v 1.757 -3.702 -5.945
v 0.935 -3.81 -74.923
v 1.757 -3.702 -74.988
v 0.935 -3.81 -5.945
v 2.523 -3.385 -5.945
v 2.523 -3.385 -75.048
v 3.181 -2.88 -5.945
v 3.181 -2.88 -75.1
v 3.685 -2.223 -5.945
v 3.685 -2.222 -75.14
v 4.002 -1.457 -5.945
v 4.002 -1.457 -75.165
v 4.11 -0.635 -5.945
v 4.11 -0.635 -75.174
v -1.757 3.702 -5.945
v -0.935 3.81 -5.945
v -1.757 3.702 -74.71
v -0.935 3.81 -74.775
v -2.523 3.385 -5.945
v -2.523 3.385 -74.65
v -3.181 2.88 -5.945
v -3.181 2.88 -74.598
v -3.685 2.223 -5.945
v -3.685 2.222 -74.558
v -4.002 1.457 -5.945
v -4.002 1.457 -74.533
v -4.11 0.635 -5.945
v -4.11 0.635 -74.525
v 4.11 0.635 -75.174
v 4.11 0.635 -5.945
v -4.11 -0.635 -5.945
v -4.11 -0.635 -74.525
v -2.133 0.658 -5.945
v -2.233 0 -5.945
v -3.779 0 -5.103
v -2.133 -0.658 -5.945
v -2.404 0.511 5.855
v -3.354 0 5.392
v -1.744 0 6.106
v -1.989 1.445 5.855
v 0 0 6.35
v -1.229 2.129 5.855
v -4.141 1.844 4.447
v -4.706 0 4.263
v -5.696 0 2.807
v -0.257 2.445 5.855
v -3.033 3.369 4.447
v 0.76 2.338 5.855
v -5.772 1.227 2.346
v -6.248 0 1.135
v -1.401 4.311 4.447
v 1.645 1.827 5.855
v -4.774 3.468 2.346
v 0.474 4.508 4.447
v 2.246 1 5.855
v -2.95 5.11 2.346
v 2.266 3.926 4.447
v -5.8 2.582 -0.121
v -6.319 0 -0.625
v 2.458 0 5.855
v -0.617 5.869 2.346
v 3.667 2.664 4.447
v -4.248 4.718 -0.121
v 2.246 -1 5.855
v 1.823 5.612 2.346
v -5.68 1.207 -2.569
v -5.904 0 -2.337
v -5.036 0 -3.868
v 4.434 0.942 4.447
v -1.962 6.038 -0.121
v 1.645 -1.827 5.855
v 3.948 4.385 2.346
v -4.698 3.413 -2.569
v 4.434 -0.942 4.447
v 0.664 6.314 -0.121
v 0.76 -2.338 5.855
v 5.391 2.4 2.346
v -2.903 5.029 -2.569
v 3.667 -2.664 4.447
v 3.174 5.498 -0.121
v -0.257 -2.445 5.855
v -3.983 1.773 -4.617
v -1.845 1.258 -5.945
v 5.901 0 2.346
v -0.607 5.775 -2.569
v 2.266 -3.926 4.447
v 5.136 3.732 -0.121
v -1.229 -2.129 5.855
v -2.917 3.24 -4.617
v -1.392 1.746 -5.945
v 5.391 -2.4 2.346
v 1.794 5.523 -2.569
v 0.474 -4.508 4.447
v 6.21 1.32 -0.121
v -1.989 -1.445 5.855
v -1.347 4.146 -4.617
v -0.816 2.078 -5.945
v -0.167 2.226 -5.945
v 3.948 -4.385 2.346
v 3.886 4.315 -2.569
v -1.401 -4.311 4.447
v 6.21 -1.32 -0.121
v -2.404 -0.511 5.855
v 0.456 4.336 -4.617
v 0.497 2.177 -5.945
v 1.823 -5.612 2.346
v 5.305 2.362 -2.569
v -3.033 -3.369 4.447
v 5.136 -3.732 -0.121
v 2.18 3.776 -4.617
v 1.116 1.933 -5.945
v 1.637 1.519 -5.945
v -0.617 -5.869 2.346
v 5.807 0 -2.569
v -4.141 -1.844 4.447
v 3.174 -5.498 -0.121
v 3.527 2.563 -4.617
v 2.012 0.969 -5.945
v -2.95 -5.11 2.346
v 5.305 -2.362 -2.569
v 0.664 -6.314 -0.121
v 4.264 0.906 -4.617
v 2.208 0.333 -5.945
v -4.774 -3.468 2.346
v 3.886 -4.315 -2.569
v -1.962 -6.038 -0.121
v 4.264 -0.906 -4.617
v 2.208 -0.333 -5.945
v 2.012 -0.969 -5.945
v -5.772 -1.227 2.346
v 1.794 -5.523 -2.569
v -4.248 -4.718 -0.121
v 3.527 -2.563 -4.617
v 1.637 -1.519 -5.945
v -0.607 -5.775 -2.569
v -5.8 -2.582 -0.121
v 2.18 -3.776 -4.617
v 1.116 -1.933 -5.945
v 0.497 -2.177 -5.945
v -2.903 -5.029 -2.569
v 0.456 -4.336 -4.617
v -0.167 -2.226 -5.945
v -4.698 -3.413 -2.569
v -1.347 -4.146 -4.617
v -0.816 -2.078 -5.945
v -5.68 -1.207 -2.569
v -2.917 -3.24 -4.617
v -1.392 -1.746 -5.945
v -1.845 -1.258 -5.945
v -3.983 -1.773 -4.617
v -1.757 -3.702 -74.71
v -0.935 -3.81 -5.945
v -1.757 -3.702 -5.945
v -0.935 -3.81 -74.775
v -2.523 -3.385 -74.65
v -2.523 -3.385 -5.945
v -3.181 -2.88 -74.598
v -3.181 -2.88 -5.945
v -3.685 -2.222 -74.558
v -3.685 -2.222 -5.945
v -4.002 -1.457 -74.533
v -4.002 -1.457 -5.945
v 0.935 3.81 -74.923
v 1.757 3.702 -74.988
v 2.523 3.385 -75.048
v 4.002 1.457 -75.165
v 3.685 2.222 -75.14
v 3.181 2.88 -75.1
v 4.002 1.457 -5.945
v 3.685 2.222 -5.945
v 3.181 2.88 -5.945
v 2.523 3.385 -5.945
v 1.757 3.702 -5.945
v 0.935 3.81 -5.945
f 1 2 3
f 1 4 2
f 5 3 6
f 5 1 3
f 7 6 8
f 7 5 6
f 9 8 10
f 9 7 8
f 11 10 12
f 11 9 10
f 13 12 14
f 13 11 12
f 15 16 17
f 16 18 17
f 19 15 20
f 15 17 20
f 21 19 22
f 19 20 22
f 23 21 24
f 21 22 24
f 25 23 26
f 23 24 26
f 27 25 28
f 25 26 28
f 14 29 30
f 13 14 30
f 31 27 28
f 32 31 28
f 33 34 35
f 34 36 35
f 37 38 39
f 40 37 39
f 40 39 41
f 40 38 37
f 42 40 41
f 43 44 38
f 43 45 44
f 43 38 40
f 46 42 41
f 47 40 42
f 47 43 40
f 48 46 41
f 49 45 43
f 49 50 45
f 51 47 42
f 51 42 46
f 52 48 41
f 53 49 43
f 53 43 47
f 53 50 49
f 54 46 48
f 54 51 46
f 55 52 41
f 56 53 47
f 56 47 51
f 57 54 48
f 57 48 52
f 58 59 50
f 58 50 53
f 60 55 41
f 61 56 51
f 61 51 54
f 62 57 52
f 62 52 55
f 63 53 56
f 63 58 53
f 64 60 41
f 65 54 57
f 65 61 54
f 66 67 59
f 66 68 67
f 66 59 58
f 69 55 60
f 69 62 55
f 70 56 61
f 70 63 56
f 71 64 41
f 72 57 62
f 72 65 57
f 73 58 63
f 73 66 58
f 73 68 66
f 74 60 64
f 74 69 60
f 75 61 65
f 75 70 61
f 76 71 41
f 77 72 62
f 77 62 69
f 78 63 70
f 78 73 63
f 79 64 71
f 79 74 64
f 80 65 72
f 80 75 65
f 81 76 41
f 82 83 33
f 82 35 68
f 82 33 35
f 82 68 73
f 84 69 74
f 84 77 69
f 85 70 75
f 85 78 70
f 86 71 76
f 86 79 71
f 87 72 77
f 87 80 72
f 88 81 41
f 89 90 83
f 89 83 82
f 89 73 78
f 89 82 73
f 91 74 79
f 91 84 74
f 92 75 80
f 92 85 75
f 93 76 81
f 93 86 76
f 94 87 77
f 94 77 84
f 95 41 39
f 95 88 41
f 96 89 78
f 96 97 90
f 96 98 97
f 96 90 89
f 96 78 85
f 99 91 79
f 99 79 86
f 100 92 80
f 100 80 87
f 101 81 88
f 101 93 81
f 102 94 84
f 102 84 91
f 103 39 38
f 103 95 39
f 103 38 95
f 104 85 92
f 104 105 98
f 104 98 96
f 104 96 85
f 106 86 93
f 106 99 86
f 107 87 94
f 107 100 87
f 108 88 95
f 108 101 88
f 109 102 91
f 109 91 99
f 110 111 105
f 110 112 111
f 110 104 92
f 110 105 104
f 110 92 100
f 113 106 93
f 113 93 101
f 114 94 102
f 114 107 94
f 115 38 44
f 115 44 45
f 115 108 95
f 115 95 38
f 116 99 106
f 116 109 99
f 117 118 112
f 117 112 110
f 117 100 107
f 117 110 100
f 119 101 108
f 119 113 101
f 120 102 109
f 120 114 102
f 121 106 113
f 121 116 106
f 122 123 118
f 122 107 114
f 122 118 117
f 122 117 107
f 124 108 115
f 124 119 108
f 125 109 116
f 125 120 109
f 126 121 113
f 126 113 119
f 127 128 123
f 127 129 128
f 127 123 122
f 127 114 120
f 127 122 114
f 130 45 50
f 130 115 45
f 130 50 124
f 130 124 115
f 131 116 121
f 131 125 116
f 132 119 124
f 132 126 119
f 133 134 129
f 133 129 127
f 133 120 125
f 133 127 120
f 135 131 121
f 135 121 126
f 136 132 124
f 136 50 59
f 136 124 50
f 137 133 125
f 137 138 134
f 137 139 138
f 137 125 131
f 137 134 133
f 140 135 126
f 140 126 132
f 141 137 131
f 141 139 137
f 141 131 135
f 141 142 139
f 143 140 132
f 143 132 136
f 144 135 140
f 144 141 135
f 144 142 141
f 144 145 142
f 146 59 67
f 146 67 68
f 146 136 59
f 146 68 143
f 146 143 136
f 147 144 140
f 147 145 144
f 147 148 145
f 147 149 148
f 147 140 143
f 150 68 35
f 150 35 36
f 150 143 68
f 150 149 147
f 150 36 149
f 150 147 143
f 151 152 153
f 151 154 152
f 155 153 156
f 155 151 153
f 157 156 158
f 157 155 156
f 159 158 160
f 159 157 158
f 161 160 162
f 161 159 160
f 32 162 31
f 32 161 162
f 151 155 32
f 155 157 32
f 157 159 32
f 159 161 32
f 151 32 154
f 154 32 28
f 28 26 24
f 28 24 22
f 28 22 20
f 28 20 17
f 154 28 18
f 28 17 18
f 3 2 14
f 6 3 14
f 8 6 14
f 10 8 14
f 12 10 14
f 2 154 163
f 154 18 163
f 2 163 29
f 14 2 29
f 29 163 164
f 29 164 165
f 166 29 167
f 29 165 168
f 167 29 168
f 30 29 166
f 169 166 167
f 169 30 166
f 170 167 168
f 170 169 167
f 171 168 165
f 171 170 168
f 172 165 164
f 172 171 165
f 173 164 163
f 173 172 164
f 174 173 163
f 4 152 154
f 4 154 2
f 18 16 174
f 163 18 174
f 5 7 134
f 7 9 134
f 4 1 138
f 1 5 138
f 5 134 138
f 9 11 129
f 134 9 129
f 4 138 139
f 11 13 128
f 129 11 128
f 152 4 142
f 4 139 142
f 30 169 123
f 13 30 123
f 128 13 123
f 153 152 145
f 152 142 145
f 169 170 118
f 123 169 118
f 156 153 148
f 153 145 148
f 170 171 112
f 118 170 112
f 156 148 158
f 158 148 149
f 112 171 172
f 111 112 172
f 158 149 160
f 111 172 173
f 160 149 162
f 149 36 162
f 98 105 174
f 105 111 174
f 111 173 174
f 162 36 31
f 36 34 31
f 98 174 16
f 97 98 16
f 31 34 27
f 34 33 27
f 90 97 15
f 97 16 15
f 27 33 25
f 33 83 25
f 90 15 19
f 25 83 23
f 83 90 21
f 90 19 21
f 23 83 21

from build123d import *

# Parameters (mm, degrees)
F3_DEPTH      = 3.81
F3_DEPTH_BACK = 3.81
F4_R          = 3.175


with BuildPart() as f1:
    # F0 (on Front) → F1 (revolve)
    with BuildSketch(Plane.XZ):
        with BuildLine():
            Line((0, -6.35), (0, 6.35))
            ThreePointArc((0, 6.35), (-6.35, 0), (0, -6.35))
        make_face()
    revolve(axis=Axis((0, 0, 0), (0, 0, -1)))

    # F2 (on Front) → F3 (join, two sides)
    with BuildSketch(Plane.XZ) as f3_sk:
        Polygon((4.1104733182, -5.9445748625), (-4.1104737839, -5.9445748625), (-4.1104737839, -74.5245748625), (4.1104733182, -75.1735985691), align=None)
    extrude(amount=-F3_DEPTH)
    extrude(f3_sk.sketch, amount=F3_DEPTH_BACK)

    # F4
    f4_edges = [f1.edges().sort_by_distance(p)[0] for p in [
        (4.110473, -3.81, -40.559087),
        (4.110473, 3.81, -40.559087),
        (-4.110474, -3.81, -40.234575),
        (-4.110474, 3.81, -40.234575),
    ]]
    fillet(f4_edges, radius=F4_R)


solid = f1.part
